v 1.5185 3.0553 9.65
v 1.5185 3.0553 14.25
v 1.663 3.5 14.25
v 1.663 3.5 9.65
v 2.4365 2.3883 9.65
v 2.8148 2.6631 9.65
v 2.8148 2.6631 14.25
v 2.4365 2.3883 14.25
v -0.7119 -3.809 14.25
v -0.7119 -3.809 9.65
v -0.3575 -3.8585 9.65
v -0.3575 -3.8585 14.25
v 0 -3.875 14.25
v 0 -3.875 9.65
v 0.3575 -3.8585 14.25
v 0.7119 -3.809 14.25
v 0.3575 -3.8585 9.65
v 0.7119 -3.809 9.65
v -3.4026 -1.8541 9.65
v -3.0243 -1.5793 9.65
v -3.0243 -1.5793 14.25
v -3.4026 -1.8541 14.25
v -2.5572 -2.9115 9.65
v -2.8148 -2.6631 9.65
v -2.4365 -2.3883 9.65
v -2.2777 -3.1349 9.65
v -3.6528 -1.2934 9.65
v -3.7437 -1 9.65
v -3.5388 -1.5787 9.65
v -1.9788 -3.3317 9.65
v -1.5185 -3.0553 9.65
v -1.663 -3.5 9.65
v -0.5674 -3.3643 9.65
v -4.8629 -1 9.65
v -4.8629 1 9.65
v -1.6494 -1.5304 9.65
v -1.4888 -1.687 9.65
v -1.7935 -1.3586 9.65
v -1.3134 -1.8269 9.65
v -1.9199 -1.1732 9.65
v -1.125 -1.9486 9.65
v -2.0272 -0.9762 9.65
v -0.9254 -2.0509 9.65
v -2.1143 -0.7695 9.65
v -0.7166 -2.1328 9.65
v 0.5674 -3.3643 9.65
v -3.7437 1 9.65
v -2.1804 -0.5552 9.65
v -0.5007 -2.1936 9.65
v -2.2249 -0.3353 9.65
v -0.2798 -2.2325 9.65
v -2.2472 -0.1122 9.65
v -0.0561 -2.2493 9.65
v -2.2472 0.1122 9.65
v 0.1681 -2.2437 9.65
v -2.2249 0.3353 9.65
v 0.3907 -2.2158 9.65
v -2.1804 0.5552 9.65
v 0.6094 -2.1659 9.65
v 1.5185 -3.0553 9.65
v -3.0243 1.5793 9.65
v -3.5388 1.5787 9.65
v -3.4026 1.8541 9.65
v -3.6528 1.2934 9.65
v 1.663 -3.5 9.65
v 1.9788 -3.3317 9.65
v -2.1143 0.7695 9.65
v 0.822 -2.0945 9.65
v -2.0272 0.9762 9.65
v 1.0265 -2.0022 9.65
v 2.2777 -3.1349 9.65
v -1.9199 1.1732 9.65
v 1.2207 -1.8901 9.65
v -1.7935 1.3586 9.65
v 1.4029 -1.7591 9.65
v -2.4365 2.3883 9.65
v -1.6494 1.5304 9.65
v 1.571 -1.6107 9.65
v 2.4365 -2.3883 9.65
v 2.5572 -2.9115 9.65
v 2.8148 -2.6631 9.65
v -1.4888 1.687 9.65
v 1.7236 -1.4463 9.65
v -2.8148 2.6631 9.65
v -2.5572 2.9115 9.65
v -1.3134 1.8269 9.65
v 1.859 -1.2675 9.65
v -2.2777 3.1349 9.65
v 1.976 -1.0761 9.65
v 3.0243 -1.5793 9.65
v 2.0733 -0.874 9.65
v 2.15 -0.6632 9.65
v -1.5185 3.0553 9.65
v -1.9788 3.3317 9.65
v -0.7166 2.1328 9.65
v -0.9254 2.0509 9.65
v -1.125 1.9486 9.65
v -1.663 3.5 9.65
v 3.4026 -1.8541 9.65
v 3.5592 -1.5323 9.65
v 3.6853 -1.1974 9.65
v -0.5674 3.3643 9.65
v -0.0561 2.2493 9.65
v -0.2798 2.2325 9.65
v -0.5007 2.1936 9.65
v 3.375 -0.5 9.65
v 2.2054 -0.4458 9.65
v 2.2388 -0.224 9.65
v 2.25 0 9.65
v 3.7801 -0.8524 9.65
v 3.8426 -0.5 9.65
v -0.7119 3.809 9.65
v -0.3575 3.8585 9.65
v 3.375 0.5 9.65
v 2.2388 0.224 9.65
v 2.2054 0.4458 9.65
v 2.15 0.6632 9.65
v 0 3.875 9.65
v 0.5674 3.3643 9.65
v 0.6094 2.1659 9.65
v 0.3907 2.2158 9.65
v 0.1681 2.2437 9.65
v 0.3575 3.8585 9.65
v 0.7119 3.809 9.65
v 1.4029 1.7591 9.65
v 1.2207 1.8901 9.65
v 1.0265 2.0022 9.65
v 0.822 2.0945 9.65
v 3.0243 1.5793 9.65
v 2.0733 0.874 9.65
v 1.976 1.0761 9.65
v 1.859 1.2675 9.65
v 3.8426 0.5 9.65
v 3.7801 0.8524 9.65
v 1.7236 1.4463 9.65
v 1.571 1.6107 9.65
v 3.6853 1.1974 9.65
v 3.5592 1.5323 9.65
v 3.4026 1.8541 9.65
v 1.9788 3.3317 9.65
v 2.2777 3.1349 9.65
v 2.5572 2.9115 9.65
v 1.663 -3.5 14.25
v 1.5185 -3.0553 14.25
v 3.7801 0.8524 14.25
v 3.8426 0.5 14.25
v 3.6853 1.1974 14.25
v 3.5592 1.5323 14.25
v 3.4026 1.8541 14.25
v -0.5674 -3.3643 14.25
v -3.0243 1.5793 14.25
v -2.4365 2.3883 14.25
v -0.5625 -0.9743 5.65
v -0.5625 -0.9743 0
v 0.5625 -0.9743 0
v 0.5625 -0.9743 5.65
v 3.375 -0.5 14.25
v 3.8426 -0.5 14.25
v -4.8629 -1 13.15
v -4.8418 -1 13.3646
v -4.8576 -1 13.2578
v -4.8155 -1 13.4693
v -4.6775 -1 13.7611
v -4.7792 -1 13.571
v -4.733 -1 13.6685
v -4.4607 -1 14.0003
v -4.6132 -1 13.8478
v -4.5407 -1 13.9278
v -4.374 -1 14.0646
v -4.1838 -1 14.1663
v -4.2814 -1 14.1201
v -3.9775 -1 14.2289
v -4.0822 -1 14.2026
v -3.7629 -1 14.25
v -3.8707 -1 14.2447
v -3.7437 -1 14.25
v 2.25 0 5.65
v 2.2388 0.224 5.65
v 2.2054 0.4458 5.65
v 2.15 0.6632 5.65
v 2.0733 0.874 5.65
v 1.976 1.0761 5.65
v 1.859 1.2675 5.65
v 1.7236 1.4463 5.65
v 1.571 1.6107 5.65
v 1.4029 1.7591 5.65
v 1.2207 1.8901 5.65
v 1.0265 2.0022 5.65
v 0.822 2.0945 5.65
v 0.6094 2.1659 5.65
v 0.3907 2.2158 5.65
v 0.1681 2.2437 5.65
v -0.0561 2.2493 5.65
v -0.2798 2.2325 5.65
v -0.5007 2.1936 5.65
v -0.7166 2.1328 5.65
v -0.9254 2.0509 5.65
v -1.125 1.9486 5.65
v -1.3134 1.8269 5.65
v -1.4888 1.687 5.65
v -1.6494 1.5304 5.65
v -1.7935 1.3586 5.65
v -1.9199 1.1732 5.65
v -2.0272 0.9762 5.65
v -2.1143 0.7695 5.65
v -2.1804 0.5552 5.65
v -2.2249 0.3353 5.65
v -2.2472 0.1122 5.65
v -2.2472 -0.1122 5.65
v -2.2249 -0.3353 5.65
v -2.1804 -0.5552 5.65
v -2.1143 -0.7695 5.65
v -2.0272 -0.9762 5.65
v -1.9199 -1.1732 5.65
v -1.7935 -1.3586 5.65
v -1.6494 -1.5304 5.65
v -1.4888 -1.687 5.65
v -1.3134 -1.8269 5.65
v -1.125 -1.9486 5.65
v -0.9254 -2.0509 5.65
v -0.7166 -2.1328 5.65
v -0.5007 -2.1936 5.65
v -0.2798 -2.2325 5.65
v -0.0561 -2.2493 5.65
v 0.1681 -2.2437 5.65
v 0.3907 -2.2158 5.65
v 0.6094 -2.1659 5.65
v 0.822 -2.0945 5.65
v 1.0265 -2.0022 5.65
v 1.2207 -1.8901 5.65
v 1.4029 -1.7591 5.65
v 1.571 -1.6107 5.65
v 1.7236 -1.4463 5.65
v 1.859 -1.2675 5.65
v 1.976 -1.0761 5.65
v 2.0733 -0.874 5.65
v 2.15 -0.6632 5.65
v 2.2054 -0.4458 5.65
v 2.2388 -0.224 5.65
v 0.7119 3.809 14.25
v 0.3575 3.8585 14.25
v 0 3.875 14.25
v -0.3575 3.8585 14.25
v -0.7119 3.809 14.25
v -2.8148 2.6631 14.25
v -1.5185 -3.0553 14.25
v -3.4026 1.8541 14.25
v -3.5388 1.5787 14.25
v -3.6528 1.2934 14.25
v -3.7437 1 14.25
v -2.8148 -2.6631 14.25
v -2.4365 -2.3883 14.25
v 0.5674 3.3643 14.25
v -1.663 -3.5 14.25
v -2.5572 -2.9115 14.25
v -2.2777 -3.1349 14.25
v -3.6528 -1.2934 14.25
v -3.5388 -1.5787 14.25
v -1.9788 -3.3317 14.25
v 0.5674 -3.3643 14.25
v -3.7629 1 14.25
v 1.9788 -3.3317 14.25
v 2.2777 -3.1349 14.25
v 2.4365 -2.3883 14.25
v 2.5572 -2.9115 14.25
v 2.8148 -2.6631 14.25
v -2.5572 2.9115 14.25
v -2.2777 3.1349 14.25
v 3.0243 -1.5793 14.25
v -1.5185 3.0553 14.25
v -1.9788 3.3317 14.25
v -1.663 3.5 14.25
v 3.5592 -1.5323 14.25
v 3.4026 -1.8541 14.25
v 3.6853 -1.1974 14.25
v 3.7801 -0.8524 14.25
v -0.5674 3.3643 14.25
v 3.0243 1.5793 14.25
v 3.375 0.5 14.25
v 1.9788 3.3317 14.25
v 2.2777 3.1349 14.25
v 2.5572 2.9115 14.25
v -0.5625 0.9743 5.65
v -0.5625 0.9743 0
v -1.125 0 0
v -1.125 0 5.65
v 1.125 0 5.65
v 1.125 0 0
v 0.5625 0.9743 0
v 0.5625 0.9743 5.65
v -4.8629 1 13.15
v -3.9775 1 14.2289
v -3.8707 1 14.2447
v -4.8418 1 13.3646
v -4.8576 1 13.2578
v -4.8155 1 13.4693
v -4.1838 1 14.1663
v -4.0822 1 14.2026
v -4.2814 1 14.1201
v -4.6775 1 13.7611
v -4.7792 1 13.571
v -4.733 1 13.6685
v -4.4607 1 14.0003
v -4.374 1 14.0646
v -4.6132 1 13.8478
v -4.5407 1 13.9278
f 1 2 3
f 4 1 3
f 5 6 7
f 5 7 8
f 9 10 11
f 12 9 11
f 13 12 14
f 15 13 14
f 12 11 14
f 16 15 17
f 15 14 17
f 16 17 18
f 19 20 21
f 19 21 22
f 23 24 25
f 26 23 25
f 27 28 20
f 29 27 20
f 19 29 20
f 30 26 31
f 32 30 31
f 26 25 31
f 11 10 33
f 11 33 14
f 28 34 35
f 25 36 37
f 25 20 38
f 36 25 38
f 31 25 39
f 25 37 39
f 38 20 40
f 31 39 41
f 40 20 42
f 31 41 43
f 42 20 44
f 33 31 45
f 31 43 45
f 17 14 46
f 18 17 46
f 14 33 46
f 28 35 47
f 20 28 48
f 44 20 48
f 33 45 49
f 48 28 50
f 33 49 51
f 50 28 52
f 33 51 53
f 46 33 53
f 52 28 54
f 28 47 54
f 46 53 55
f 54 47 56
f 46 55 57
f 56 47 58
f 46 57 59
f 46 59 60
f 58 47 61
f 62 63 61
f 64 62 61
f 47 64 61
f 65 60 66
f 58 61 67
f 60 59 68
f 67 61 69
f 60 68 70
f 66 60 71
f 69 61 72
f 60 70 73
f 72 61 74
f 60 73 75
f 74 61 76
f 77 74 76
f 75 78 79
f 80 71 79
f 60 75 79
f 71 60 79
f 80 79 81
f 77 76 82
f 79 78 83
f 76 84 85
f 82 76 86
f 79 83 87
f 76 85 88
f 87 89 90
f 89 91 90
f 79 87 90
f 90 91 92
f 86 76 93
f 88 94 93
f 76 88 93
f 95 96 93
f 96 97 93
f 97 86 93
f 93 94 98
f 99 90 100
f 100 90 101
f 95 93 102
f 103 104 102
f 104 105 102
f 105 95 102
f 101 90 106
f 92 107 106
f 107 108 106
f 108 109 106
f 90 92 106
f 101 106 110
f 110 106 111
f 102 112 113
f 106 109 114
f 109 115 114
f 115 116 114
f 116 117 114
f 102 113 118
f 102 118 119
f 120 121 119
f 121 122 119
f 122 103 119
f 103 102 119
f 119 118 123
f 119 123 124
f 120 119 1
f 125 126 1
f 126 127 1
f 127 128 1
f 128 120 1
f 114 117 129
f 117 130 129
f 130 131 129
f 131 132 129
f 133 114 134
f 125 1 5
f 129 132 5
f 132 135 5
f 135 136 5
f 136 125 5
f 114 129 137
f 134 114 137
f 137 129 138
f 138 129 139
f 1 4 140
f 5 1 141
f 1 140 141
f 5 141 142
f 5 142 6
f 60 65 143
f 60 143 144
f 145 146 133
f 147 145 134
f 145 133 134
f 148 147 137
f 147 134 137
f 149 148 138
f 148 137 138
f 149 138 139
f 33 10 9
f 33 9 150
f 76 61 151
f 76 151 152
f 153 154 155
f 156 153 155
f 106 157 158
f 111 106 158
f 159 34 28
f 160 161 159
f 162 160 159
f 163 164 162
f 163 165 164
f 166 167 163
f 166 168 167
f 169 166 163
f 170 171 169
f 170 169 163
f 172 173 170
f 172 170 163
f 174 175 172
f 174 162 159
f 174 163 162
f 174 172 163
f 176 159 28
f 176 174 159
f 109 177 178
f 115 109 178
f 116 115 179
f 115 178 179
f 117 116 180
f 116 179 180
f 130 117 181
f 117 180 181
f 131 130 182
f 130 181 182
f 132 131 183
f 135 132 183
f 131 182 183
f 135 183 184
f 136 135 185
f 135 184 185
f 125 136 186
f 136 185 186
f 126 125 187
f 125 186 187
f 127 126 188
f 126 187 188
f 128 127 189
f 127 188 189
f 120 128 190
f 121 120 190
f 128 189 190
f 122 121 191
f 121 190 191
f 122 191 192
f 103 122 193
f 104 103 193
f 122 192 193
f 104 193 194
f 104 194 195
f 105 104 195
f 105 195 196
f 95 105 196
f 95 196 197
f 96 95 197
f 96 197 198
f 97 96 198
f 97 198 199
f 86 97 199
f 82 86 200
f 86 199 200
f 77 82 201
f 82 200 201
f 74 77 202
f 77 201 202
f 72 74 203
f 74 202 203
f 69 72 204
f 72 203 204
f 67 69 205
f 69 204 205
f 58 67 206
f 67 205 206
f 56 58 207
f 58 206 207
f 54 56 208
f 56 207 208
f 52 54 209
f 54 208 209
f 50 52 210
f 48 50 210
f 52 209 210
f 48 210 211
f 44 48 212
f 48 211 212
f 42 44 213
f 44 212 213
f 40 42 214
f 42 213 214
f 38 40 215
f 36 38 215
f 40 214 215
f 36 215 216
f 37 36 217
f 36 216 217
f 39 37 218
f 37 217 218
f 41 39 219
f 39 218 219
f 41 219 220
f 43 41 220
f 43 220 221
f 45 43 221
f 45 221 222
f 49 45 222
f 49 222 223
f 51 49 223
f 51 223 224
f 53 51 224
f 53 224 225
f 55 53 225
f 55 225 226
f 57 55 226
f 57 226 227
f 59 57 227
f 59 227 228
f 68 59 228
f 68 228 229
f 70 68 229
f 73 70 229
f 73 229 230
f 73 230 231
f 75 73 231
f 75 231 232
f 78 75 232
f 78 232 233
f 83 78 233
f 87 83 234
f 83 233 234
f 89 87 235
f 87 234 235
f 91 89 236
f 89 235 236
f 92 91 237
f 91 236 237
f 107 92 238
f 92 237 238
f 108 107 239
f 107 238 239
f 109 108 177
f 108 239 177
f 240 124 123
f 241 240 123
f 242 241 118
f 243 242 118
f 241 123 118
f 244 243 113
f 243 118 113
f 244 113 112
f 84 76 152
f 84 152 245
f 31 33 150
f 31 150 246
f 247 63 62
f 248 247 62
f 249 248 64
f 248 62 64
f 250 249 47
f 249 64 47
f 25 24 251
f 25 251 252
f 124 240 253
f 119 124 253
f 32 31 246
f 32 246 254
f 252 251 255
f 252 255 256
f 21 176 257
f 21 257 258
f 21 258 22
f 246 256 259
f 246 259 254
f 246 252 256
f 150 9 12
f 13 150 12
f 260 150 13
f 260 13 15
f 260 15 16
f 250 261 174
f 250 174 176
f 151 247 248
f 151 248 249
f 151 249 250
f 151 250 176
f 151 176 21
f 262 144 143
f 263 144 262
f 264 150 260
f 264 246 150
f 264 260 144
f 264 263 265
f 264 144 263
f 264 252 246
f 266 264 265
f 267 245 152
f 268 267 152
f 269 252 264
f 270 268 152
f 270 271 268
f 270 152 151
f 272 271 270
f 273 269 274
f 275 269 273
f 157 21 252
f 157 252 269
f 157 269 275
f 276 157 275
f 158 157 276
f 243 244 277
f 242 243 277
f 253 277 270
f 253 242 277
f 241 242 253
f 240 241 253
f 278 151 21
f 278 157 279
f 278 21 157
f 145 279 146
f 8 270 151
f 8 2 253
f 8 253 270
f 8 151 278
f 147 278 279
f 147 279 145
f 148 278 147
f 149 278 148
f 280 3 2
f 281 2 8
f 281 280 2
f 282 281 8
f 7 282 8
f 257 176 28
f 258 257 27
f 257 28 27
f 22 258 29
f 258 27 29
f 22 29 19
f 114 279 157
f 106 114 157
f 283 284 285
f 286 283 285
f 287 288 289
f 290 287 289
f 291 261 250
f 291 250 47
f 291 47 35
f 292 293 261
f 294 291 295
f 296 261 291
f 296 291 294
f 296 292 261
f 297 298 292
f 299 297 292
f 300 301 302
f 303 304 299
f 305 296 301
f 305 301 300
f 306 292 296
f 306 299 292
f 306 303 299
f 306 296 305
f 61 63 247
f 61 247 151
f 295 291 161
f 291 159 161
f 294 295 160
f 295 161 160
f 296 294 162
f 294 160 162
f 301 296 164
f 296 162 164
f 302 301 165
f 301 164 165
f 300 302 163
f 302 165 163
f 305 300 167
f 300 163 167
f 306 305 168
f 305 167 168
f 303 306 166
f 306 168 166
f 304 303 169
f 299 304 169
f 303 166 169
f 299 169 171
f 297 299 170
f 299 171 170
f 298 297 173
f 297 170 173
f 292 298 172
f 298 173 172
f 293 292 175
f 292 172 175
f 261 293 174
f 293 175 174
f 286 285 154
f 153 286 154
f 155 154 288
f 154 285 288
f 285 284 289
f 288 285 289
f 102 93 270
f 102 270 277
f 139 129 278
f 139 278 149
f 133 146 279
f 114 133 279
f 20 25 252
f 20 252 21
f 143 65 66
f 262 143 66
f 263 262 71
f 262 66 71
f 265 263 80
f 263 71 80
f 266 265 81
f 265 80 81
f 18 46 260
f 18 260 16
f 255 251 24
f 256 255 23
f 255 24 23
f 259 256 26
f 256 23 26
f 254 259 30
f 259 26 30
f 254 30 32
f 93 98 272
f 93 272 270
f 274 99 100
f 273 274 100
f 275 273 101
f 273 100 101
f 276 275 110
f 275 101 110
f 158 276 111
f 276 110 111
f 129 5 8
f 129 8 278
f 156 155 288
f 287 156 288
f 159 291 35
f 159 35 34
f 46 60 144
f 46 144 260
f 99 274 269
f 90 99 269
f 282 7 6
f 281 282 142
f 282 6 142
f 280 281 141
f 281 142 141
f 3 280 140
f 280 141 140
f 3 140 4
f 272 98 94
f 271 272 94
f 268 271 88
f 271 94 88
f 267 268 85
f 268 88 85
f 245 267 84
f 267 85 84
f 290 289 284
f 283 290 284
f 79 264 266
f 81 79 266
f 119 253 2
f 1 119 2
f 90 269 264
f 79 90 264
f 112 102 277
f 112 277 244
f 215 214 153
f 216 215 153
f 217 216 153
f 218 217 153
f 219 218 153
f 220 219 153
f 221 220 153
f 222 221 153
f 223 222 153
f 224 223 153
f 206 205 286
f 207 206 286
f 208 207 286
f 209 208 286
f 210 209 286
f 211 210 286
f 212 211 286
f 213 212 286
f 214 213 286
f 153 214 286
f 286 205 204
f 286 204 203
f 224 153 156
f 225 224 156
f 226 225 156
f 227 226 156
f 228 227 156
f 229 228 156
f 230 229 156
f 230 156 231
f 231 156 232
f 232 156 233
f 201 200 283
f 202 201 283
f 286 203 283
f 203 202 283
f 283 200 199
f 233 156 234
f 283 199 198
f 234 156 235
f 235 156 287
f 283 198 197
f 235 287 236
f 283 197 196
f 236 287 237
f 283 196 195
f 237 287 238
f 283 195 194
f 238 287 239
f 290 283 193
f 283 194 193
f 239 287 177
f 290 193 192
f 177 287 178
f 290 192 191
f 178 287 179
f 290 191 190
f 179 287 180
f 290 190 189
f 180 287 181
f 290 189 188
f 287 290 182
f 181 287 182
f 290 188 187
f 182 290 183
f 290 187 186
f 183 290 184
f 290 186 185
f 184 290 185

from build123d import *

# Parameters (mm, degrees)
F1_DEPTH  = 5.65
F2_R      = 2.25
F3_DEPTH  = 4
F4_R      = 3.875
F5_DEPTH  = 4.6
F7_DEPTH  = 5
F9_COUNT  = 10
F12_DEPTH = 4.6
F13_R     = 1.1


with BuildPart() as f1:
    # F0 (on Top) → F1 (new body)
    with BuildSketch(Plane.XY):
        Polygon((-0.5625, -0.974279), (0.5625, -0.974279), (1.125, 0), (0.5625, 0.974279), (-0.5625, 0.974279), (-1.125, 0), align=None)
    extrude(amount=F1_DEPTH)

    # F2 (on face) → F3 (join)
    with BuildSketch(Plane.XY.offset(5.65)):
        Circle(F2_R)
    extrude(amount=F3_DEPTH)

    # F4 (on face) → F5 (join)
    with BuildSketch(Plane.XY.offset(9.65)):
        Circle(F4_R)
    extrude(amount=F5_DEPTH)


with BuildPart() as f7:
    # F6 (on face) → F7 (new body)
    with BuildSketch(Plane.XY.offset(14.25)):
        with BuildLine():
            Line((3.842607, -0.5), (4.375, -0.5))
            Line((4.375, -0.5), (4.375, 0.5))
            Line((4.375, 0.5), (3.842607, 0.5))
            ThreePointArc((3.842607, 0.5), (3.866893, 0.250524), (3.875, 0))
            ThreePointArc((3.875, 0), (3.866893, -0.250524), (3.842607, -0.5))
        make_face()
        with BuildLine():
            Line((3.375, -0.5), (3.842607, -0.5))
            ThreePointArc((3.842607, -0.5), (3.866893, -0.250524), (3.875, 0))
            ThreePointArc((3.875, 0), (3.866893, 0.250524), (3.842607, 0.5))
            Line((3.842607, 0.5), (3.375, 0.5))
            Line((3.375, 0.5), (3.375, -0.5))
        make_face()
    extrude(amount=-F7_DEPTH)


with BuildPart() as f9_1:
    # F9: instance of F7
    add(f7.part.rotate(Axis((0, 0, 7.362194), (0, 0, -1)), 1 * 360 / F9_COUNT))


with BuildPart() as f9_2:
    # F9: instance of F7
    add(f7.part.rotate(Axis((0, 0, 7.362194), (0, 0, -1)), 2 * 360 / F9_COUNT))


with BuildPart() as f9_3:
    # F9: instance of F7
    add(f7.part.rotate(Axis((0, 0, 7.362194), (0, 0, -1)), 3 * 360 / F9_COUNT))


with BuildPart() as f9_4:
    # F9: instance of F7
    add(f7.part.rotate(Axis((0, 0, 7.362194), (0, 0, -1)), 4 * 360 / F9_COUNT))


with BuildPart() as f9_5:
    # F9: instance of F7
    add(f7.part.rotate(Axis((0, 0, 7.362194), (0, 0, -1)), 5 * 360 / F9_COUNT))


with BuildPart() as f9_6:
    # F9: instance of F7
    add(f7.part.rotate(Axis((0, 0, 7.362194), (0, 0, -1)), 6 * 360 / F9_COUNT))


with BuildPart() as f9_7:
    # F9: instance of F7
    add(f7.part.rotate(Axis((0, 0, 7.362194), (0, 0, -1)), 7 * 360 / F9_COUNT))


with BuildPart() as f9_8:
    # F9: instance of F7
    add(f7.part.rotate(Axis((0, 0, 7.362194), (0, 0, -1)), 8 * 360 / F9_COUNT))


with BuildPart() as f9_9:
    # F9: instance of F7
    add(f7.part.rotate(Axis((0, 0, 7.362194), (0, 0, -1)), 9 * 360 / F9_COUNT))


with BuildPart() as f1_1:
    add(f1.part)

    # F10: cut F7, F9_1, F9_2, F9_3, F9_4, F9_5, F9_6, F9_7, F9_8, F9_9
    add(f7.part, mode=Mode.SUBTRACT)
    add(f9_1.part, mode=Mode.SUBTRACT)
    add(f9_2.part, mode=Mode.SUBTRACT)
    add(f9_3.part, mode=Mode.SUBTRACT)
    add(f9_4.part, mode=Mode.SUBTRACT)
    add(f9_5.part, mode=Mode.SUBTRACT)
    add(f9_6.part, mode=Mode.SUBTRACT)
    add(f9_7.part, mode=Mode.SUBTRACT)
    add(f9_8.part, mode=Mode.SUBTRACT)
    add(f9_9.part, mode=Mode.SUBTRACT)

    # F11 (on face) → F12 (join)
    with BuildSketch(Plane.XY.offset(14.25)):
        with BuildLine():
            Line((-4.86289, -1), (-3.743745, -1))
            ThreePointArc((-3.743745, -1), (-3.801405, -0.751627), (-3.842607, -0.5))
            Line((-3.842607, -0.5), (-3.375, -0.5))
            Line((-3.375, -0.5), (-3.375, 0.5))
            Line((-3.375, 0.5), (-3.842607, 0.5))
            ThreePointArc((-3.842607, 0.5), (-3.801405, 0.751627), (-3.743745, 1))
            Line((-3.743745, 1), (-4.86289, 1))
            Line((-4.86289, 1), (-4.86289, -1))
        make_face()
    extrude(amount=-F12_DEPTH)

    # F13
    f13_edges = [f1_1.edges().sort_by_distance(p)[0] for p in [
        (-4.86289, 0, 14.25),
    ]]
    fillet(f13_edges, radius=F13_R)


solid = f1_1.part
